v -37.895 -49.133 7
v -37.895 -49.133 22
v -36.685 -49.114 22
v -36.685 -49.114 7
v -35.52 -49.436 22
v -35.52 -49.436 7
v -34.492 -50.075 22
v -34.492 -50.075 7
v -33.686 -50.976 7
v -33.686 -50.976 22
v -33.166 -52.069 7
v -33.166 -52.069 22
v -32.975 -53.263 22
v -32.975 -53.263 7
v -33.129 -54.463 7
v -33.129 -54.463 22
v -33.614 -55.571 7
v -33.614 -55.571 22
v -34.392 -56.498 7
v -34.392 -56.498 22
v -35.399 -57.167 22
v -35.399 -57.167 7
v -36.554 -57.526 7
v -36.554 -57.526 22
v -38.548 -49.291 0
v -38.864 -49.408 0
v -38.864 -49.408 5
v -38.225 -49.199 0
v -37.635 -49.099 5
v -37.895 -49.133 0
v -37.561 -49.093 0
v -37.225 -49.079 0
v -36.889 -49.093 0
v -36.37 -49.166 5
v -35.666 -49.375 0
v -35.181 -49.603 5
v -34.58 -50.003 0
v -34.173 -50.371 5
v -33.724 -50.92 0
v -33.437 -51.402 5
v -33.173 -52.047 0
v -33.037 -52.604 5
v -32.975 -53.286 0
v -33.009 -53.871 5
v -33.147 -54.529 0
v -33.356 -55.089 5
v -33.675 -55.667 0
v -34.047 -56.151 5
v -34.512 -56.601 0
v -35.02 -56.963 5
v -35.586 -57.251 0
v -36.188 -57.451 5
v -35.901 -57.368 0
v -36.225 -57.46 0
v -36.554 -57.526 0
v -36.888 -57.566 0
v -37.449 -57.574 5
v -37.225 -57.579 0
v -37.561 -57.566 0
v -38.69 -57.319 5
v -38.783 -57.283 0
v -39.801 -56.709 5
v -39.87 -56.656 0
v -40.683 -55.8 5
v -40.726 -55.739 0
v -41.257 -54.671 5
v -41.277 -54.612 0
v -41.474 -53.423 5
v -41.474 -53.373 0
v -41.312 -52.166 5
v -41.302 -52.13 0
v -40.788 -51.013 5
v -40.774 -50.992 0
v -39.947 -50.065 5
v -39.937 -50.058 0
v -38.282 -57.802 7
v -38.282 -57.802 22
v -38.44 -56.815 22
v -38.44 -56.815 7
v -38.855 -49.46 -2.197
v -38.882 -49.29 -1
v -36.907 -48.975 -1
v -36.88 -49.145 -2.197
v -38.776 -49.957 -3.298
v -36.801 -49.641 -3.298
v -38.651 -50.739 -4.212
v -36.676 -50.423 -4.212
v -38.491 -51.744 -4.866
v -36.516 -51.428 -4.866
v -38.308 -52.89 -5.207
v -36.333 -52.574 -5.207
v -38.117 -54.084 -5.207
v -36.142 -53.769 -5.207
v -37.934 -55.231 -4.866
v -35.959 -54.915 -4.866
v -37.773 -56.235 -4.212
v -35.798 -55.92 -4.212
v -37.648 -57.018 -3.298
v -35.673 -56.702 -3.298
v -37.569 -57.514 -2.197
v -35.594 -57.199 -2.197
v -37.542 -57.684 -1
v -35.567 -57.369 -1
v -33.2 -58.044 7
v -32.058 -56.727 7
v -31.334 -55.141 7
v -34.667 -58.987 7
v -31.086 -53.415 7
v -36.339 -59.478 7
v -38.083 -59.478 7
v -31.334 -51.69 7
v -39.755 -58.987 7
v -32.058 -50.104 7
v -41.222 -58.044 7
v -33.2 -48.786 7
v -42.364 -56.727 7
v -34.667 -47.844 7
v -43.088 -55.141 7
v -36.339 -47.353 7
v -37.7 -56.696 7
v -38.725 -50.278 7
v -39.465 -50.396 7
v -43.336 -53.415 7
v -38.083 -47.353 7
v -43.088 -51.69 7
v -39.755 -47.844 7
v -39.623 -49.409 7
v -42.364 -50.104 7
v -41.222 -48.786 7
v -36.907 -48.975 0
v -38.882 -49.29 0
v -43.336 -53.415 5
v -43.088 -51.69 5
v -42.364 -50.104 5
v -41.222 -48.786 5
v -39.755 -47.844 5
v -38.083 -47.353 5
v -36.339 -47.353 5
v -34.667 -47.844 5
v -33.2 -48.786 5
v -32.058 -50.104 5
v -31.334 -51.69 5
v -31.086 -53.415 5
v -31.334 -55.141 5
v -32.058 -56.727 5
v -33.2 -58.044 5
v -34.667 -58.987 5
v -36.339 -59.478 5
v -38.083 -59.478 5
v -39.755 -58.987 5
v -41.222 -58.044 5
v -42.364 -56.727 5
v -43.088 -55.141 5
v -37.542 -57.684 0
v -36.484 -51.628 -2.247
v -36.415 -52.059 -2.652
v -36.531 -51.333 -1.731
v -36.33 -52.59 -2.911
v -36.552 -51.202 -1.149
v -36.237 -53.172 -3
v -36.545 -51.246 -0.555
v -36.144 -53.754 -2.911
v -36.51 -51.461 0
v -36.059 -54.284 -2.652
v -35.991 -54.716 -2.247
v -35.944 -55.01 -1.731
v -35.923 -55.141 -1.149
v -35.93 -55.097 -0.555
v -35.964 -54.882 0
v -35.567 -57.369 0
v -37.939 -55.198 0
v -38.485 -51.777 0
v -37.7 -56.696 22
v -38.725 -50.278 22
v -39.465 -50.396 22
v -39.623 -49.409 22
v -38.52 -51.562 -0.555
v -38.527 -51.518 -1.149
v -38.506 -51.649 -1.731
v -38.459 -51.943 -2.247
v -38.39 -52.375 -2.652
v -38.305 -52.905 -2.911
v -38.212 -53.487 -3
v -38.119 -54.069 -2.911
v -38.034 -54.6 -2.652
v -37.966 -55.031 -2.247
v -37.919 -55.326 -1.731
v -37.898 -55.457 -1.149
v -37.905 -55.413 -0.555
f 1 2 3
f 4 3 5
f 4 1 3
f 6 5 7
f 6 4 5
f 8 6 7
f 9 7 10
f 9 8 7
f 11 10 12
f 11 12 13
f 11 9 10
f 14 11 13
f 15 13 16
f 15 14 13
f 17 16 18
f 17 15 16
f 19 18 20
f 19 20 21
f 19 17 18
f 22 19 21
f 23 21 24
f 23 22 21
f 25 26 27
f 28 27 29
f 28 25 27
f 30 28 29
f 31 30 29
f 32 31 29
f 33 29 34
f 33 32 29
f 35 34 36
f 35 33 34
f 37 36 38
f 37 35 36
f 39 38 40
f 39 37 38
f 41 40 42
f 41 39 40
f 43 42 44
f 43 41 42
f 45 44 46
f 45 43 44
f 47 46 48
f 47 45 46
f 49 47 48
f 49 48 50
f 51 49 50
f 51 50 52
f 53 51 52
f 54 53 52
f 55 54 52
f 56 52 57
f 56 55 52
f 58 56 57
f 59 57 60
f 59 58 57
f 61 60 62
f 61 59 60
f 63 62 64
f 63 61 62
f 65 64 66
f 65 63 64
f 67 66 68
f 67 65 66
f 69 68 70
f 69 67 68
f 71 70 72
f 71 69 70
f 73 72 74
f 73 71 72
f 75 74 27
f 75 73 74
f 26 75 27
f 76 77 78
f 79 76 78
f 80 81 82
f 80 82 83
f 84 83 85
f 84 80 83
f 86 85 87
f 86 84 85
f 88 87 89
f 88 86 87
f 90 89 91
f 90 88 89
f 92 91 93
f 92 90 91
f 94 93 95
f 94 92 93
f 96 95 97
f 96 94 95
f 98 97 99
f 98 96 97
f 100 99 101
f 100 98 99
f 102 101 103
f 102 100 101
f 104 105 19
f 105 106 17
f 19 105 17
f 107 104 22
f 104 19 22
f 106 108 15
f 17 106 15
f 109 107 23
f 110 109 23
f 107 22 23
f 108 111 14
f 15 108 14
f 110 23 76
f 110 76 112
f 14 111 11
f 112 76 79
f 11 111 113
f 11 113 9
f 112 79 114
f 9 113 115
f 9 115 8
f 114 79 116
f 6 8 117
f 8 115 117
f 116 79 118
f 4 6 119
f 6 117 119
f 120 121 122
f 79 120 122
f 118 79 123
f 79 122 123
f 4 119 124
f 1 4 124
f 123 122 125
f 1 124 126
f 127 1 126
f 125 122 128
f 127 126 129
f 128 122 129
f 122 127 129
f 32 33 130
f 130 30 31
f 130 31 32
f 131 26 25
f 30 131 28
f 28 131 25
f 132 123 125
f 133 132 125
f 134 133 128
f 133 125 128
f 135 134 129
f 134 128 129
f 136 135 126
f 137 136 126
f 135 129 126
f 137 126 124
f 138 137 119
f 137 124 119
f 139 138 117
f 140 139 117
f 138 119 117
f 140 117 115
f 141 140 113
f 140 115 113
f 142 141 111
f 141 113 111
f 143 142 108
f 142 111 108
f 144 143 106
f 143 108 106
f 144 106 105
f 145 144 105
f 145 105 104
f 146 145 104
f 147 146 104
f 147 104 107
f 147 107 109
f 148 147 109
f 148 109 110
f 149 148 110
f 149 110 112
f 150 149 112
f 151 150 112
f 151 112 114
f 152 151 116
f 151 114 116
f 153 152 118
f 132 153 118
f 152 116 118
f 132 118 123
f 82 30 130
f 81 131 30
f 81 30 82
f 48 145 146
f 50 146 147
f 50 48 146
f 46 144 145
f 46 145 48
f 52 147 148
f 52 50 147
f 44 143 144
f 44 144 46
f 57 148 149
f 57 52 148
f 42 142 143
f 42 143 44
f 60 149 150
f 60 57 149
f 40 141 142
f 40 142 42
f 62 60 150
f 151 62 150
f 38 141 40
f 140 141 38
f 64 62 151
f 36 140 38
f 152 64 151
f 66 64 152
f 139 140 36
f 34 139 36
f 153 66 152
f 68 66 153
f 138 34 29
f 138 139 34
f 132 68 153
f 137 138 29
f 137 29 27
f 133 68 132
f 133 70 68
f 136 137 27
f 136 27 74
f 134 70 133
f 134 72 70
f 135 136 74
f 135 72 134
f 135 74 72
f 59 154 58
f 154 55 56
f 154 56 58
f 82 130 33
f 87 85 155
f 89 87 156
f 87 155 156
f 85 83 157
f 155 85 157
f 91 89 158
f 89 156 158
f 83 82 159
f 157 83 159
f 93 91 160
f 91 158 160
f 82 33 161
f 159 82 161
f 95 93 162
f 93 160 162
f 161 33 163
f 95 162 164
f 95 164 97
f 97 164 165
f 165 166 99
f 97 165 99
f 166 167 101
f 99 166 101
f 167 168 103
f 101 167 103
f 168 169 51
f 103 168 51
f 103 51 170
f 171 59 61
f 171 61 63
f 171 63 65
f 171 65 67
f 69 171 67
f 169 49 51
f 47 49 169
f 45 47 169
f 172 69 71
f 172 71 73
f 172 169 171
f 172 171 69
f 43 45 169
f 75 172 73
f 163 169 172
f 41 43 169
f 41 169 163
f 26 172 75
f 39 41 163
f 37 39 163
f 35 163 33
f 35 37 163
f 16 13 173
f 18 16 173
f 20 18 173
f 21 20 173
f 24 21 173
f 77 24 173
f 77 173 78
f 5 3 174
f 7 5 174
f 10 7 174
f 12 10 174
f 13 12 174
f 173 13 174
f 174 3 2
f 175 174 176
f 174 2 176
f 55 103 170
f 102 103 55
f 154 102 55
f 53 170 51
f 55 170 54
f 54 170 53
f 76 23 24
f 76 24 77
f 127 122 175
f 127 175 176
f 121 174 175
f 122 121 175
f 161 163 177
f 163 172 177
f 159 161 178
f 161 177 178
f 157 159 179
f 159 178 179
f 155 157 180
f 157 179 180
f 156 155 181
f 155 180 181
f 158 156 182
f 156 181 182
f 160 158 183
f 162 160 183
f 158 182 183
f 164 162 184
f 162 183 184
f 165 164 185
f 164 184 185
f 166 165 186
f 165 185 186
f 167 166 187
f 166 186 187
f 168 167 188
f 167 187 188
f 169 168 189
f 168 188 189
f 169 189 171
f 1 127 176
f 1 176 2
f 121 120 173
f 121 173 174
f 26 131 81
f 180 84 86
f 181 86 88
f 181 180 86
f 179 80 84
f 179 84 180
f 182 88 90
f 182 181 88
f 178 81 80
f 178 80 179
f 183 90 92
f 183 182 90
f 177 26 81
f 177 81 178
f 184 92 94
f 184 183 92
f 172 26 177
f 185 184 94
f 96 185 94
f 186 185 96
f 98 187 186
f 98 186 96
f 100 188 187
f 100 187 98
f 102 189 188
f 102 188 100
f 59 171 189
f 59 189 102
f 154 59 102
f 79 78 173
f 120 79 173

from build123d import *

# Parameters (mm, degrees)
SALIENTE_EXTRUIR1_DEPTH           = 2
DI_METRO_DE_TALADRO_4_0_4_1_D     = 4
DI_METRO_DE_TALADRO_4_0_4_1_DEPTH = 3.323811401
CROQUIS4_R                        = 4.25
SALIENTE_EXTRUIR2_DEPTH           = 7
SALIENTE_EXTRUIR3_DEPTH           = 15
CORTAR_EXTRUIR1_DEPTH             = 15
CROQUIS7_R                        = 6.125
SALIENTE_EXTRUIR4_DEPTH           = 2


with BuildPart() as part:
    # Croquis1 → Saliente-Extruir1 (new body)
    with BuildSketch(Plane(origin=(-45.591866133, -7.28172098, 0), x_dir=(0.15771642640636402, -0.9874844448605792, 0), z_dir=(-0.9874844448605792, -0.15771642640636402, 0))):
        with BuildLine():
            Line((51.04106459, 0), (42.54106459, 0))
            Line((42.54106459, 0), (42.54106459, -1))
            ThreePointArc((42.54106459, -1), (46.79106459, -5.25), (51.04106459, -1))
            Line((51.04106459, -1), (51.04106459, 0))
        make_face()
    extrude(amount=-SALIENTE_EXTRUIR1_DEPTH)

    # Diámetro de taladro Ø4.0 (4)1
    with Locations(Plane(origin=(-43.616897243, -6.966288127, 0), x_dir=(0, 0, -1), z_dir=(0.9874844448605791, 0.15771642640636402, 0))):
        with Locations((1, -46.79106459)):
            Hole(DI_METRO_DE_TALADRO_4_0_4_1_D / 2, depth=DI_METRO_DE_TALADRO_4_0_4_1_DEPTH)

    # Croquis4 → Saliente-Extruir2 (add)
    with BuildSketch(Plane(origin=(0, 0, 0), x_dir=(-1, 0, 0), z_dir=(0, 0, -1))):
        with Locations(Location((37.224662193, -53.329452995, 0), (0, 0, 67.316665151))):
            Circle(CROQUIS4_R)
    extrude(amount=-SALIENTE_EXTRUIR2_DEPTH)

    # Croquis5 → Saliente-Extruir3 (add)
    with BuildSketch(Plane.XY.offset(7)):
        with BuildLine():
            Line((-39.623054784, -49.408647851), (-37.894957006, -49.132644104))
            ThreePointArc((-37.894957006, -49.132644104), (-33.027853303, -52.659158183), (-36.554367381, -57.526261886))
            Line((-36.554367381, -57.526261886), (-38.28246516, -57.802265632))
            Line((-38.28246516, -57.802265632), (-39.623054784, -49.408647851))
        make_face()
    extrude(amount=SALIENTE_EXTRUIR3_DEPTH)

    # Croquis6 → Cortar-Extruir1 (cut)
    with BuildSketch(Plane.XY.offset(22)):
        Polygon((-38.724725024, -50.277844976), (-39.712209469, -50.435561402), (-38.687052697, -56.854210294), (-37.699568252, -56.696493867), align=None)
    extrude(amount=-CORTAR_EXTRUIR1_DEPTH, mode=Mode.SUBTRACT)

    # Croquis7 → Saliente-Extruir4 (add)
    with BuildSketch(Plane(origin=(0, 0, 7), x_dir=(-1, 0, 0), z_dir=(0, 0, -1))):
        with Locations((37.21095217, -53.415293358)):
            Circle(CROQUIS7_R)
    extrude(amount=SALIENTE_EXTRUIR4_DEPTH)


solid = part.part
